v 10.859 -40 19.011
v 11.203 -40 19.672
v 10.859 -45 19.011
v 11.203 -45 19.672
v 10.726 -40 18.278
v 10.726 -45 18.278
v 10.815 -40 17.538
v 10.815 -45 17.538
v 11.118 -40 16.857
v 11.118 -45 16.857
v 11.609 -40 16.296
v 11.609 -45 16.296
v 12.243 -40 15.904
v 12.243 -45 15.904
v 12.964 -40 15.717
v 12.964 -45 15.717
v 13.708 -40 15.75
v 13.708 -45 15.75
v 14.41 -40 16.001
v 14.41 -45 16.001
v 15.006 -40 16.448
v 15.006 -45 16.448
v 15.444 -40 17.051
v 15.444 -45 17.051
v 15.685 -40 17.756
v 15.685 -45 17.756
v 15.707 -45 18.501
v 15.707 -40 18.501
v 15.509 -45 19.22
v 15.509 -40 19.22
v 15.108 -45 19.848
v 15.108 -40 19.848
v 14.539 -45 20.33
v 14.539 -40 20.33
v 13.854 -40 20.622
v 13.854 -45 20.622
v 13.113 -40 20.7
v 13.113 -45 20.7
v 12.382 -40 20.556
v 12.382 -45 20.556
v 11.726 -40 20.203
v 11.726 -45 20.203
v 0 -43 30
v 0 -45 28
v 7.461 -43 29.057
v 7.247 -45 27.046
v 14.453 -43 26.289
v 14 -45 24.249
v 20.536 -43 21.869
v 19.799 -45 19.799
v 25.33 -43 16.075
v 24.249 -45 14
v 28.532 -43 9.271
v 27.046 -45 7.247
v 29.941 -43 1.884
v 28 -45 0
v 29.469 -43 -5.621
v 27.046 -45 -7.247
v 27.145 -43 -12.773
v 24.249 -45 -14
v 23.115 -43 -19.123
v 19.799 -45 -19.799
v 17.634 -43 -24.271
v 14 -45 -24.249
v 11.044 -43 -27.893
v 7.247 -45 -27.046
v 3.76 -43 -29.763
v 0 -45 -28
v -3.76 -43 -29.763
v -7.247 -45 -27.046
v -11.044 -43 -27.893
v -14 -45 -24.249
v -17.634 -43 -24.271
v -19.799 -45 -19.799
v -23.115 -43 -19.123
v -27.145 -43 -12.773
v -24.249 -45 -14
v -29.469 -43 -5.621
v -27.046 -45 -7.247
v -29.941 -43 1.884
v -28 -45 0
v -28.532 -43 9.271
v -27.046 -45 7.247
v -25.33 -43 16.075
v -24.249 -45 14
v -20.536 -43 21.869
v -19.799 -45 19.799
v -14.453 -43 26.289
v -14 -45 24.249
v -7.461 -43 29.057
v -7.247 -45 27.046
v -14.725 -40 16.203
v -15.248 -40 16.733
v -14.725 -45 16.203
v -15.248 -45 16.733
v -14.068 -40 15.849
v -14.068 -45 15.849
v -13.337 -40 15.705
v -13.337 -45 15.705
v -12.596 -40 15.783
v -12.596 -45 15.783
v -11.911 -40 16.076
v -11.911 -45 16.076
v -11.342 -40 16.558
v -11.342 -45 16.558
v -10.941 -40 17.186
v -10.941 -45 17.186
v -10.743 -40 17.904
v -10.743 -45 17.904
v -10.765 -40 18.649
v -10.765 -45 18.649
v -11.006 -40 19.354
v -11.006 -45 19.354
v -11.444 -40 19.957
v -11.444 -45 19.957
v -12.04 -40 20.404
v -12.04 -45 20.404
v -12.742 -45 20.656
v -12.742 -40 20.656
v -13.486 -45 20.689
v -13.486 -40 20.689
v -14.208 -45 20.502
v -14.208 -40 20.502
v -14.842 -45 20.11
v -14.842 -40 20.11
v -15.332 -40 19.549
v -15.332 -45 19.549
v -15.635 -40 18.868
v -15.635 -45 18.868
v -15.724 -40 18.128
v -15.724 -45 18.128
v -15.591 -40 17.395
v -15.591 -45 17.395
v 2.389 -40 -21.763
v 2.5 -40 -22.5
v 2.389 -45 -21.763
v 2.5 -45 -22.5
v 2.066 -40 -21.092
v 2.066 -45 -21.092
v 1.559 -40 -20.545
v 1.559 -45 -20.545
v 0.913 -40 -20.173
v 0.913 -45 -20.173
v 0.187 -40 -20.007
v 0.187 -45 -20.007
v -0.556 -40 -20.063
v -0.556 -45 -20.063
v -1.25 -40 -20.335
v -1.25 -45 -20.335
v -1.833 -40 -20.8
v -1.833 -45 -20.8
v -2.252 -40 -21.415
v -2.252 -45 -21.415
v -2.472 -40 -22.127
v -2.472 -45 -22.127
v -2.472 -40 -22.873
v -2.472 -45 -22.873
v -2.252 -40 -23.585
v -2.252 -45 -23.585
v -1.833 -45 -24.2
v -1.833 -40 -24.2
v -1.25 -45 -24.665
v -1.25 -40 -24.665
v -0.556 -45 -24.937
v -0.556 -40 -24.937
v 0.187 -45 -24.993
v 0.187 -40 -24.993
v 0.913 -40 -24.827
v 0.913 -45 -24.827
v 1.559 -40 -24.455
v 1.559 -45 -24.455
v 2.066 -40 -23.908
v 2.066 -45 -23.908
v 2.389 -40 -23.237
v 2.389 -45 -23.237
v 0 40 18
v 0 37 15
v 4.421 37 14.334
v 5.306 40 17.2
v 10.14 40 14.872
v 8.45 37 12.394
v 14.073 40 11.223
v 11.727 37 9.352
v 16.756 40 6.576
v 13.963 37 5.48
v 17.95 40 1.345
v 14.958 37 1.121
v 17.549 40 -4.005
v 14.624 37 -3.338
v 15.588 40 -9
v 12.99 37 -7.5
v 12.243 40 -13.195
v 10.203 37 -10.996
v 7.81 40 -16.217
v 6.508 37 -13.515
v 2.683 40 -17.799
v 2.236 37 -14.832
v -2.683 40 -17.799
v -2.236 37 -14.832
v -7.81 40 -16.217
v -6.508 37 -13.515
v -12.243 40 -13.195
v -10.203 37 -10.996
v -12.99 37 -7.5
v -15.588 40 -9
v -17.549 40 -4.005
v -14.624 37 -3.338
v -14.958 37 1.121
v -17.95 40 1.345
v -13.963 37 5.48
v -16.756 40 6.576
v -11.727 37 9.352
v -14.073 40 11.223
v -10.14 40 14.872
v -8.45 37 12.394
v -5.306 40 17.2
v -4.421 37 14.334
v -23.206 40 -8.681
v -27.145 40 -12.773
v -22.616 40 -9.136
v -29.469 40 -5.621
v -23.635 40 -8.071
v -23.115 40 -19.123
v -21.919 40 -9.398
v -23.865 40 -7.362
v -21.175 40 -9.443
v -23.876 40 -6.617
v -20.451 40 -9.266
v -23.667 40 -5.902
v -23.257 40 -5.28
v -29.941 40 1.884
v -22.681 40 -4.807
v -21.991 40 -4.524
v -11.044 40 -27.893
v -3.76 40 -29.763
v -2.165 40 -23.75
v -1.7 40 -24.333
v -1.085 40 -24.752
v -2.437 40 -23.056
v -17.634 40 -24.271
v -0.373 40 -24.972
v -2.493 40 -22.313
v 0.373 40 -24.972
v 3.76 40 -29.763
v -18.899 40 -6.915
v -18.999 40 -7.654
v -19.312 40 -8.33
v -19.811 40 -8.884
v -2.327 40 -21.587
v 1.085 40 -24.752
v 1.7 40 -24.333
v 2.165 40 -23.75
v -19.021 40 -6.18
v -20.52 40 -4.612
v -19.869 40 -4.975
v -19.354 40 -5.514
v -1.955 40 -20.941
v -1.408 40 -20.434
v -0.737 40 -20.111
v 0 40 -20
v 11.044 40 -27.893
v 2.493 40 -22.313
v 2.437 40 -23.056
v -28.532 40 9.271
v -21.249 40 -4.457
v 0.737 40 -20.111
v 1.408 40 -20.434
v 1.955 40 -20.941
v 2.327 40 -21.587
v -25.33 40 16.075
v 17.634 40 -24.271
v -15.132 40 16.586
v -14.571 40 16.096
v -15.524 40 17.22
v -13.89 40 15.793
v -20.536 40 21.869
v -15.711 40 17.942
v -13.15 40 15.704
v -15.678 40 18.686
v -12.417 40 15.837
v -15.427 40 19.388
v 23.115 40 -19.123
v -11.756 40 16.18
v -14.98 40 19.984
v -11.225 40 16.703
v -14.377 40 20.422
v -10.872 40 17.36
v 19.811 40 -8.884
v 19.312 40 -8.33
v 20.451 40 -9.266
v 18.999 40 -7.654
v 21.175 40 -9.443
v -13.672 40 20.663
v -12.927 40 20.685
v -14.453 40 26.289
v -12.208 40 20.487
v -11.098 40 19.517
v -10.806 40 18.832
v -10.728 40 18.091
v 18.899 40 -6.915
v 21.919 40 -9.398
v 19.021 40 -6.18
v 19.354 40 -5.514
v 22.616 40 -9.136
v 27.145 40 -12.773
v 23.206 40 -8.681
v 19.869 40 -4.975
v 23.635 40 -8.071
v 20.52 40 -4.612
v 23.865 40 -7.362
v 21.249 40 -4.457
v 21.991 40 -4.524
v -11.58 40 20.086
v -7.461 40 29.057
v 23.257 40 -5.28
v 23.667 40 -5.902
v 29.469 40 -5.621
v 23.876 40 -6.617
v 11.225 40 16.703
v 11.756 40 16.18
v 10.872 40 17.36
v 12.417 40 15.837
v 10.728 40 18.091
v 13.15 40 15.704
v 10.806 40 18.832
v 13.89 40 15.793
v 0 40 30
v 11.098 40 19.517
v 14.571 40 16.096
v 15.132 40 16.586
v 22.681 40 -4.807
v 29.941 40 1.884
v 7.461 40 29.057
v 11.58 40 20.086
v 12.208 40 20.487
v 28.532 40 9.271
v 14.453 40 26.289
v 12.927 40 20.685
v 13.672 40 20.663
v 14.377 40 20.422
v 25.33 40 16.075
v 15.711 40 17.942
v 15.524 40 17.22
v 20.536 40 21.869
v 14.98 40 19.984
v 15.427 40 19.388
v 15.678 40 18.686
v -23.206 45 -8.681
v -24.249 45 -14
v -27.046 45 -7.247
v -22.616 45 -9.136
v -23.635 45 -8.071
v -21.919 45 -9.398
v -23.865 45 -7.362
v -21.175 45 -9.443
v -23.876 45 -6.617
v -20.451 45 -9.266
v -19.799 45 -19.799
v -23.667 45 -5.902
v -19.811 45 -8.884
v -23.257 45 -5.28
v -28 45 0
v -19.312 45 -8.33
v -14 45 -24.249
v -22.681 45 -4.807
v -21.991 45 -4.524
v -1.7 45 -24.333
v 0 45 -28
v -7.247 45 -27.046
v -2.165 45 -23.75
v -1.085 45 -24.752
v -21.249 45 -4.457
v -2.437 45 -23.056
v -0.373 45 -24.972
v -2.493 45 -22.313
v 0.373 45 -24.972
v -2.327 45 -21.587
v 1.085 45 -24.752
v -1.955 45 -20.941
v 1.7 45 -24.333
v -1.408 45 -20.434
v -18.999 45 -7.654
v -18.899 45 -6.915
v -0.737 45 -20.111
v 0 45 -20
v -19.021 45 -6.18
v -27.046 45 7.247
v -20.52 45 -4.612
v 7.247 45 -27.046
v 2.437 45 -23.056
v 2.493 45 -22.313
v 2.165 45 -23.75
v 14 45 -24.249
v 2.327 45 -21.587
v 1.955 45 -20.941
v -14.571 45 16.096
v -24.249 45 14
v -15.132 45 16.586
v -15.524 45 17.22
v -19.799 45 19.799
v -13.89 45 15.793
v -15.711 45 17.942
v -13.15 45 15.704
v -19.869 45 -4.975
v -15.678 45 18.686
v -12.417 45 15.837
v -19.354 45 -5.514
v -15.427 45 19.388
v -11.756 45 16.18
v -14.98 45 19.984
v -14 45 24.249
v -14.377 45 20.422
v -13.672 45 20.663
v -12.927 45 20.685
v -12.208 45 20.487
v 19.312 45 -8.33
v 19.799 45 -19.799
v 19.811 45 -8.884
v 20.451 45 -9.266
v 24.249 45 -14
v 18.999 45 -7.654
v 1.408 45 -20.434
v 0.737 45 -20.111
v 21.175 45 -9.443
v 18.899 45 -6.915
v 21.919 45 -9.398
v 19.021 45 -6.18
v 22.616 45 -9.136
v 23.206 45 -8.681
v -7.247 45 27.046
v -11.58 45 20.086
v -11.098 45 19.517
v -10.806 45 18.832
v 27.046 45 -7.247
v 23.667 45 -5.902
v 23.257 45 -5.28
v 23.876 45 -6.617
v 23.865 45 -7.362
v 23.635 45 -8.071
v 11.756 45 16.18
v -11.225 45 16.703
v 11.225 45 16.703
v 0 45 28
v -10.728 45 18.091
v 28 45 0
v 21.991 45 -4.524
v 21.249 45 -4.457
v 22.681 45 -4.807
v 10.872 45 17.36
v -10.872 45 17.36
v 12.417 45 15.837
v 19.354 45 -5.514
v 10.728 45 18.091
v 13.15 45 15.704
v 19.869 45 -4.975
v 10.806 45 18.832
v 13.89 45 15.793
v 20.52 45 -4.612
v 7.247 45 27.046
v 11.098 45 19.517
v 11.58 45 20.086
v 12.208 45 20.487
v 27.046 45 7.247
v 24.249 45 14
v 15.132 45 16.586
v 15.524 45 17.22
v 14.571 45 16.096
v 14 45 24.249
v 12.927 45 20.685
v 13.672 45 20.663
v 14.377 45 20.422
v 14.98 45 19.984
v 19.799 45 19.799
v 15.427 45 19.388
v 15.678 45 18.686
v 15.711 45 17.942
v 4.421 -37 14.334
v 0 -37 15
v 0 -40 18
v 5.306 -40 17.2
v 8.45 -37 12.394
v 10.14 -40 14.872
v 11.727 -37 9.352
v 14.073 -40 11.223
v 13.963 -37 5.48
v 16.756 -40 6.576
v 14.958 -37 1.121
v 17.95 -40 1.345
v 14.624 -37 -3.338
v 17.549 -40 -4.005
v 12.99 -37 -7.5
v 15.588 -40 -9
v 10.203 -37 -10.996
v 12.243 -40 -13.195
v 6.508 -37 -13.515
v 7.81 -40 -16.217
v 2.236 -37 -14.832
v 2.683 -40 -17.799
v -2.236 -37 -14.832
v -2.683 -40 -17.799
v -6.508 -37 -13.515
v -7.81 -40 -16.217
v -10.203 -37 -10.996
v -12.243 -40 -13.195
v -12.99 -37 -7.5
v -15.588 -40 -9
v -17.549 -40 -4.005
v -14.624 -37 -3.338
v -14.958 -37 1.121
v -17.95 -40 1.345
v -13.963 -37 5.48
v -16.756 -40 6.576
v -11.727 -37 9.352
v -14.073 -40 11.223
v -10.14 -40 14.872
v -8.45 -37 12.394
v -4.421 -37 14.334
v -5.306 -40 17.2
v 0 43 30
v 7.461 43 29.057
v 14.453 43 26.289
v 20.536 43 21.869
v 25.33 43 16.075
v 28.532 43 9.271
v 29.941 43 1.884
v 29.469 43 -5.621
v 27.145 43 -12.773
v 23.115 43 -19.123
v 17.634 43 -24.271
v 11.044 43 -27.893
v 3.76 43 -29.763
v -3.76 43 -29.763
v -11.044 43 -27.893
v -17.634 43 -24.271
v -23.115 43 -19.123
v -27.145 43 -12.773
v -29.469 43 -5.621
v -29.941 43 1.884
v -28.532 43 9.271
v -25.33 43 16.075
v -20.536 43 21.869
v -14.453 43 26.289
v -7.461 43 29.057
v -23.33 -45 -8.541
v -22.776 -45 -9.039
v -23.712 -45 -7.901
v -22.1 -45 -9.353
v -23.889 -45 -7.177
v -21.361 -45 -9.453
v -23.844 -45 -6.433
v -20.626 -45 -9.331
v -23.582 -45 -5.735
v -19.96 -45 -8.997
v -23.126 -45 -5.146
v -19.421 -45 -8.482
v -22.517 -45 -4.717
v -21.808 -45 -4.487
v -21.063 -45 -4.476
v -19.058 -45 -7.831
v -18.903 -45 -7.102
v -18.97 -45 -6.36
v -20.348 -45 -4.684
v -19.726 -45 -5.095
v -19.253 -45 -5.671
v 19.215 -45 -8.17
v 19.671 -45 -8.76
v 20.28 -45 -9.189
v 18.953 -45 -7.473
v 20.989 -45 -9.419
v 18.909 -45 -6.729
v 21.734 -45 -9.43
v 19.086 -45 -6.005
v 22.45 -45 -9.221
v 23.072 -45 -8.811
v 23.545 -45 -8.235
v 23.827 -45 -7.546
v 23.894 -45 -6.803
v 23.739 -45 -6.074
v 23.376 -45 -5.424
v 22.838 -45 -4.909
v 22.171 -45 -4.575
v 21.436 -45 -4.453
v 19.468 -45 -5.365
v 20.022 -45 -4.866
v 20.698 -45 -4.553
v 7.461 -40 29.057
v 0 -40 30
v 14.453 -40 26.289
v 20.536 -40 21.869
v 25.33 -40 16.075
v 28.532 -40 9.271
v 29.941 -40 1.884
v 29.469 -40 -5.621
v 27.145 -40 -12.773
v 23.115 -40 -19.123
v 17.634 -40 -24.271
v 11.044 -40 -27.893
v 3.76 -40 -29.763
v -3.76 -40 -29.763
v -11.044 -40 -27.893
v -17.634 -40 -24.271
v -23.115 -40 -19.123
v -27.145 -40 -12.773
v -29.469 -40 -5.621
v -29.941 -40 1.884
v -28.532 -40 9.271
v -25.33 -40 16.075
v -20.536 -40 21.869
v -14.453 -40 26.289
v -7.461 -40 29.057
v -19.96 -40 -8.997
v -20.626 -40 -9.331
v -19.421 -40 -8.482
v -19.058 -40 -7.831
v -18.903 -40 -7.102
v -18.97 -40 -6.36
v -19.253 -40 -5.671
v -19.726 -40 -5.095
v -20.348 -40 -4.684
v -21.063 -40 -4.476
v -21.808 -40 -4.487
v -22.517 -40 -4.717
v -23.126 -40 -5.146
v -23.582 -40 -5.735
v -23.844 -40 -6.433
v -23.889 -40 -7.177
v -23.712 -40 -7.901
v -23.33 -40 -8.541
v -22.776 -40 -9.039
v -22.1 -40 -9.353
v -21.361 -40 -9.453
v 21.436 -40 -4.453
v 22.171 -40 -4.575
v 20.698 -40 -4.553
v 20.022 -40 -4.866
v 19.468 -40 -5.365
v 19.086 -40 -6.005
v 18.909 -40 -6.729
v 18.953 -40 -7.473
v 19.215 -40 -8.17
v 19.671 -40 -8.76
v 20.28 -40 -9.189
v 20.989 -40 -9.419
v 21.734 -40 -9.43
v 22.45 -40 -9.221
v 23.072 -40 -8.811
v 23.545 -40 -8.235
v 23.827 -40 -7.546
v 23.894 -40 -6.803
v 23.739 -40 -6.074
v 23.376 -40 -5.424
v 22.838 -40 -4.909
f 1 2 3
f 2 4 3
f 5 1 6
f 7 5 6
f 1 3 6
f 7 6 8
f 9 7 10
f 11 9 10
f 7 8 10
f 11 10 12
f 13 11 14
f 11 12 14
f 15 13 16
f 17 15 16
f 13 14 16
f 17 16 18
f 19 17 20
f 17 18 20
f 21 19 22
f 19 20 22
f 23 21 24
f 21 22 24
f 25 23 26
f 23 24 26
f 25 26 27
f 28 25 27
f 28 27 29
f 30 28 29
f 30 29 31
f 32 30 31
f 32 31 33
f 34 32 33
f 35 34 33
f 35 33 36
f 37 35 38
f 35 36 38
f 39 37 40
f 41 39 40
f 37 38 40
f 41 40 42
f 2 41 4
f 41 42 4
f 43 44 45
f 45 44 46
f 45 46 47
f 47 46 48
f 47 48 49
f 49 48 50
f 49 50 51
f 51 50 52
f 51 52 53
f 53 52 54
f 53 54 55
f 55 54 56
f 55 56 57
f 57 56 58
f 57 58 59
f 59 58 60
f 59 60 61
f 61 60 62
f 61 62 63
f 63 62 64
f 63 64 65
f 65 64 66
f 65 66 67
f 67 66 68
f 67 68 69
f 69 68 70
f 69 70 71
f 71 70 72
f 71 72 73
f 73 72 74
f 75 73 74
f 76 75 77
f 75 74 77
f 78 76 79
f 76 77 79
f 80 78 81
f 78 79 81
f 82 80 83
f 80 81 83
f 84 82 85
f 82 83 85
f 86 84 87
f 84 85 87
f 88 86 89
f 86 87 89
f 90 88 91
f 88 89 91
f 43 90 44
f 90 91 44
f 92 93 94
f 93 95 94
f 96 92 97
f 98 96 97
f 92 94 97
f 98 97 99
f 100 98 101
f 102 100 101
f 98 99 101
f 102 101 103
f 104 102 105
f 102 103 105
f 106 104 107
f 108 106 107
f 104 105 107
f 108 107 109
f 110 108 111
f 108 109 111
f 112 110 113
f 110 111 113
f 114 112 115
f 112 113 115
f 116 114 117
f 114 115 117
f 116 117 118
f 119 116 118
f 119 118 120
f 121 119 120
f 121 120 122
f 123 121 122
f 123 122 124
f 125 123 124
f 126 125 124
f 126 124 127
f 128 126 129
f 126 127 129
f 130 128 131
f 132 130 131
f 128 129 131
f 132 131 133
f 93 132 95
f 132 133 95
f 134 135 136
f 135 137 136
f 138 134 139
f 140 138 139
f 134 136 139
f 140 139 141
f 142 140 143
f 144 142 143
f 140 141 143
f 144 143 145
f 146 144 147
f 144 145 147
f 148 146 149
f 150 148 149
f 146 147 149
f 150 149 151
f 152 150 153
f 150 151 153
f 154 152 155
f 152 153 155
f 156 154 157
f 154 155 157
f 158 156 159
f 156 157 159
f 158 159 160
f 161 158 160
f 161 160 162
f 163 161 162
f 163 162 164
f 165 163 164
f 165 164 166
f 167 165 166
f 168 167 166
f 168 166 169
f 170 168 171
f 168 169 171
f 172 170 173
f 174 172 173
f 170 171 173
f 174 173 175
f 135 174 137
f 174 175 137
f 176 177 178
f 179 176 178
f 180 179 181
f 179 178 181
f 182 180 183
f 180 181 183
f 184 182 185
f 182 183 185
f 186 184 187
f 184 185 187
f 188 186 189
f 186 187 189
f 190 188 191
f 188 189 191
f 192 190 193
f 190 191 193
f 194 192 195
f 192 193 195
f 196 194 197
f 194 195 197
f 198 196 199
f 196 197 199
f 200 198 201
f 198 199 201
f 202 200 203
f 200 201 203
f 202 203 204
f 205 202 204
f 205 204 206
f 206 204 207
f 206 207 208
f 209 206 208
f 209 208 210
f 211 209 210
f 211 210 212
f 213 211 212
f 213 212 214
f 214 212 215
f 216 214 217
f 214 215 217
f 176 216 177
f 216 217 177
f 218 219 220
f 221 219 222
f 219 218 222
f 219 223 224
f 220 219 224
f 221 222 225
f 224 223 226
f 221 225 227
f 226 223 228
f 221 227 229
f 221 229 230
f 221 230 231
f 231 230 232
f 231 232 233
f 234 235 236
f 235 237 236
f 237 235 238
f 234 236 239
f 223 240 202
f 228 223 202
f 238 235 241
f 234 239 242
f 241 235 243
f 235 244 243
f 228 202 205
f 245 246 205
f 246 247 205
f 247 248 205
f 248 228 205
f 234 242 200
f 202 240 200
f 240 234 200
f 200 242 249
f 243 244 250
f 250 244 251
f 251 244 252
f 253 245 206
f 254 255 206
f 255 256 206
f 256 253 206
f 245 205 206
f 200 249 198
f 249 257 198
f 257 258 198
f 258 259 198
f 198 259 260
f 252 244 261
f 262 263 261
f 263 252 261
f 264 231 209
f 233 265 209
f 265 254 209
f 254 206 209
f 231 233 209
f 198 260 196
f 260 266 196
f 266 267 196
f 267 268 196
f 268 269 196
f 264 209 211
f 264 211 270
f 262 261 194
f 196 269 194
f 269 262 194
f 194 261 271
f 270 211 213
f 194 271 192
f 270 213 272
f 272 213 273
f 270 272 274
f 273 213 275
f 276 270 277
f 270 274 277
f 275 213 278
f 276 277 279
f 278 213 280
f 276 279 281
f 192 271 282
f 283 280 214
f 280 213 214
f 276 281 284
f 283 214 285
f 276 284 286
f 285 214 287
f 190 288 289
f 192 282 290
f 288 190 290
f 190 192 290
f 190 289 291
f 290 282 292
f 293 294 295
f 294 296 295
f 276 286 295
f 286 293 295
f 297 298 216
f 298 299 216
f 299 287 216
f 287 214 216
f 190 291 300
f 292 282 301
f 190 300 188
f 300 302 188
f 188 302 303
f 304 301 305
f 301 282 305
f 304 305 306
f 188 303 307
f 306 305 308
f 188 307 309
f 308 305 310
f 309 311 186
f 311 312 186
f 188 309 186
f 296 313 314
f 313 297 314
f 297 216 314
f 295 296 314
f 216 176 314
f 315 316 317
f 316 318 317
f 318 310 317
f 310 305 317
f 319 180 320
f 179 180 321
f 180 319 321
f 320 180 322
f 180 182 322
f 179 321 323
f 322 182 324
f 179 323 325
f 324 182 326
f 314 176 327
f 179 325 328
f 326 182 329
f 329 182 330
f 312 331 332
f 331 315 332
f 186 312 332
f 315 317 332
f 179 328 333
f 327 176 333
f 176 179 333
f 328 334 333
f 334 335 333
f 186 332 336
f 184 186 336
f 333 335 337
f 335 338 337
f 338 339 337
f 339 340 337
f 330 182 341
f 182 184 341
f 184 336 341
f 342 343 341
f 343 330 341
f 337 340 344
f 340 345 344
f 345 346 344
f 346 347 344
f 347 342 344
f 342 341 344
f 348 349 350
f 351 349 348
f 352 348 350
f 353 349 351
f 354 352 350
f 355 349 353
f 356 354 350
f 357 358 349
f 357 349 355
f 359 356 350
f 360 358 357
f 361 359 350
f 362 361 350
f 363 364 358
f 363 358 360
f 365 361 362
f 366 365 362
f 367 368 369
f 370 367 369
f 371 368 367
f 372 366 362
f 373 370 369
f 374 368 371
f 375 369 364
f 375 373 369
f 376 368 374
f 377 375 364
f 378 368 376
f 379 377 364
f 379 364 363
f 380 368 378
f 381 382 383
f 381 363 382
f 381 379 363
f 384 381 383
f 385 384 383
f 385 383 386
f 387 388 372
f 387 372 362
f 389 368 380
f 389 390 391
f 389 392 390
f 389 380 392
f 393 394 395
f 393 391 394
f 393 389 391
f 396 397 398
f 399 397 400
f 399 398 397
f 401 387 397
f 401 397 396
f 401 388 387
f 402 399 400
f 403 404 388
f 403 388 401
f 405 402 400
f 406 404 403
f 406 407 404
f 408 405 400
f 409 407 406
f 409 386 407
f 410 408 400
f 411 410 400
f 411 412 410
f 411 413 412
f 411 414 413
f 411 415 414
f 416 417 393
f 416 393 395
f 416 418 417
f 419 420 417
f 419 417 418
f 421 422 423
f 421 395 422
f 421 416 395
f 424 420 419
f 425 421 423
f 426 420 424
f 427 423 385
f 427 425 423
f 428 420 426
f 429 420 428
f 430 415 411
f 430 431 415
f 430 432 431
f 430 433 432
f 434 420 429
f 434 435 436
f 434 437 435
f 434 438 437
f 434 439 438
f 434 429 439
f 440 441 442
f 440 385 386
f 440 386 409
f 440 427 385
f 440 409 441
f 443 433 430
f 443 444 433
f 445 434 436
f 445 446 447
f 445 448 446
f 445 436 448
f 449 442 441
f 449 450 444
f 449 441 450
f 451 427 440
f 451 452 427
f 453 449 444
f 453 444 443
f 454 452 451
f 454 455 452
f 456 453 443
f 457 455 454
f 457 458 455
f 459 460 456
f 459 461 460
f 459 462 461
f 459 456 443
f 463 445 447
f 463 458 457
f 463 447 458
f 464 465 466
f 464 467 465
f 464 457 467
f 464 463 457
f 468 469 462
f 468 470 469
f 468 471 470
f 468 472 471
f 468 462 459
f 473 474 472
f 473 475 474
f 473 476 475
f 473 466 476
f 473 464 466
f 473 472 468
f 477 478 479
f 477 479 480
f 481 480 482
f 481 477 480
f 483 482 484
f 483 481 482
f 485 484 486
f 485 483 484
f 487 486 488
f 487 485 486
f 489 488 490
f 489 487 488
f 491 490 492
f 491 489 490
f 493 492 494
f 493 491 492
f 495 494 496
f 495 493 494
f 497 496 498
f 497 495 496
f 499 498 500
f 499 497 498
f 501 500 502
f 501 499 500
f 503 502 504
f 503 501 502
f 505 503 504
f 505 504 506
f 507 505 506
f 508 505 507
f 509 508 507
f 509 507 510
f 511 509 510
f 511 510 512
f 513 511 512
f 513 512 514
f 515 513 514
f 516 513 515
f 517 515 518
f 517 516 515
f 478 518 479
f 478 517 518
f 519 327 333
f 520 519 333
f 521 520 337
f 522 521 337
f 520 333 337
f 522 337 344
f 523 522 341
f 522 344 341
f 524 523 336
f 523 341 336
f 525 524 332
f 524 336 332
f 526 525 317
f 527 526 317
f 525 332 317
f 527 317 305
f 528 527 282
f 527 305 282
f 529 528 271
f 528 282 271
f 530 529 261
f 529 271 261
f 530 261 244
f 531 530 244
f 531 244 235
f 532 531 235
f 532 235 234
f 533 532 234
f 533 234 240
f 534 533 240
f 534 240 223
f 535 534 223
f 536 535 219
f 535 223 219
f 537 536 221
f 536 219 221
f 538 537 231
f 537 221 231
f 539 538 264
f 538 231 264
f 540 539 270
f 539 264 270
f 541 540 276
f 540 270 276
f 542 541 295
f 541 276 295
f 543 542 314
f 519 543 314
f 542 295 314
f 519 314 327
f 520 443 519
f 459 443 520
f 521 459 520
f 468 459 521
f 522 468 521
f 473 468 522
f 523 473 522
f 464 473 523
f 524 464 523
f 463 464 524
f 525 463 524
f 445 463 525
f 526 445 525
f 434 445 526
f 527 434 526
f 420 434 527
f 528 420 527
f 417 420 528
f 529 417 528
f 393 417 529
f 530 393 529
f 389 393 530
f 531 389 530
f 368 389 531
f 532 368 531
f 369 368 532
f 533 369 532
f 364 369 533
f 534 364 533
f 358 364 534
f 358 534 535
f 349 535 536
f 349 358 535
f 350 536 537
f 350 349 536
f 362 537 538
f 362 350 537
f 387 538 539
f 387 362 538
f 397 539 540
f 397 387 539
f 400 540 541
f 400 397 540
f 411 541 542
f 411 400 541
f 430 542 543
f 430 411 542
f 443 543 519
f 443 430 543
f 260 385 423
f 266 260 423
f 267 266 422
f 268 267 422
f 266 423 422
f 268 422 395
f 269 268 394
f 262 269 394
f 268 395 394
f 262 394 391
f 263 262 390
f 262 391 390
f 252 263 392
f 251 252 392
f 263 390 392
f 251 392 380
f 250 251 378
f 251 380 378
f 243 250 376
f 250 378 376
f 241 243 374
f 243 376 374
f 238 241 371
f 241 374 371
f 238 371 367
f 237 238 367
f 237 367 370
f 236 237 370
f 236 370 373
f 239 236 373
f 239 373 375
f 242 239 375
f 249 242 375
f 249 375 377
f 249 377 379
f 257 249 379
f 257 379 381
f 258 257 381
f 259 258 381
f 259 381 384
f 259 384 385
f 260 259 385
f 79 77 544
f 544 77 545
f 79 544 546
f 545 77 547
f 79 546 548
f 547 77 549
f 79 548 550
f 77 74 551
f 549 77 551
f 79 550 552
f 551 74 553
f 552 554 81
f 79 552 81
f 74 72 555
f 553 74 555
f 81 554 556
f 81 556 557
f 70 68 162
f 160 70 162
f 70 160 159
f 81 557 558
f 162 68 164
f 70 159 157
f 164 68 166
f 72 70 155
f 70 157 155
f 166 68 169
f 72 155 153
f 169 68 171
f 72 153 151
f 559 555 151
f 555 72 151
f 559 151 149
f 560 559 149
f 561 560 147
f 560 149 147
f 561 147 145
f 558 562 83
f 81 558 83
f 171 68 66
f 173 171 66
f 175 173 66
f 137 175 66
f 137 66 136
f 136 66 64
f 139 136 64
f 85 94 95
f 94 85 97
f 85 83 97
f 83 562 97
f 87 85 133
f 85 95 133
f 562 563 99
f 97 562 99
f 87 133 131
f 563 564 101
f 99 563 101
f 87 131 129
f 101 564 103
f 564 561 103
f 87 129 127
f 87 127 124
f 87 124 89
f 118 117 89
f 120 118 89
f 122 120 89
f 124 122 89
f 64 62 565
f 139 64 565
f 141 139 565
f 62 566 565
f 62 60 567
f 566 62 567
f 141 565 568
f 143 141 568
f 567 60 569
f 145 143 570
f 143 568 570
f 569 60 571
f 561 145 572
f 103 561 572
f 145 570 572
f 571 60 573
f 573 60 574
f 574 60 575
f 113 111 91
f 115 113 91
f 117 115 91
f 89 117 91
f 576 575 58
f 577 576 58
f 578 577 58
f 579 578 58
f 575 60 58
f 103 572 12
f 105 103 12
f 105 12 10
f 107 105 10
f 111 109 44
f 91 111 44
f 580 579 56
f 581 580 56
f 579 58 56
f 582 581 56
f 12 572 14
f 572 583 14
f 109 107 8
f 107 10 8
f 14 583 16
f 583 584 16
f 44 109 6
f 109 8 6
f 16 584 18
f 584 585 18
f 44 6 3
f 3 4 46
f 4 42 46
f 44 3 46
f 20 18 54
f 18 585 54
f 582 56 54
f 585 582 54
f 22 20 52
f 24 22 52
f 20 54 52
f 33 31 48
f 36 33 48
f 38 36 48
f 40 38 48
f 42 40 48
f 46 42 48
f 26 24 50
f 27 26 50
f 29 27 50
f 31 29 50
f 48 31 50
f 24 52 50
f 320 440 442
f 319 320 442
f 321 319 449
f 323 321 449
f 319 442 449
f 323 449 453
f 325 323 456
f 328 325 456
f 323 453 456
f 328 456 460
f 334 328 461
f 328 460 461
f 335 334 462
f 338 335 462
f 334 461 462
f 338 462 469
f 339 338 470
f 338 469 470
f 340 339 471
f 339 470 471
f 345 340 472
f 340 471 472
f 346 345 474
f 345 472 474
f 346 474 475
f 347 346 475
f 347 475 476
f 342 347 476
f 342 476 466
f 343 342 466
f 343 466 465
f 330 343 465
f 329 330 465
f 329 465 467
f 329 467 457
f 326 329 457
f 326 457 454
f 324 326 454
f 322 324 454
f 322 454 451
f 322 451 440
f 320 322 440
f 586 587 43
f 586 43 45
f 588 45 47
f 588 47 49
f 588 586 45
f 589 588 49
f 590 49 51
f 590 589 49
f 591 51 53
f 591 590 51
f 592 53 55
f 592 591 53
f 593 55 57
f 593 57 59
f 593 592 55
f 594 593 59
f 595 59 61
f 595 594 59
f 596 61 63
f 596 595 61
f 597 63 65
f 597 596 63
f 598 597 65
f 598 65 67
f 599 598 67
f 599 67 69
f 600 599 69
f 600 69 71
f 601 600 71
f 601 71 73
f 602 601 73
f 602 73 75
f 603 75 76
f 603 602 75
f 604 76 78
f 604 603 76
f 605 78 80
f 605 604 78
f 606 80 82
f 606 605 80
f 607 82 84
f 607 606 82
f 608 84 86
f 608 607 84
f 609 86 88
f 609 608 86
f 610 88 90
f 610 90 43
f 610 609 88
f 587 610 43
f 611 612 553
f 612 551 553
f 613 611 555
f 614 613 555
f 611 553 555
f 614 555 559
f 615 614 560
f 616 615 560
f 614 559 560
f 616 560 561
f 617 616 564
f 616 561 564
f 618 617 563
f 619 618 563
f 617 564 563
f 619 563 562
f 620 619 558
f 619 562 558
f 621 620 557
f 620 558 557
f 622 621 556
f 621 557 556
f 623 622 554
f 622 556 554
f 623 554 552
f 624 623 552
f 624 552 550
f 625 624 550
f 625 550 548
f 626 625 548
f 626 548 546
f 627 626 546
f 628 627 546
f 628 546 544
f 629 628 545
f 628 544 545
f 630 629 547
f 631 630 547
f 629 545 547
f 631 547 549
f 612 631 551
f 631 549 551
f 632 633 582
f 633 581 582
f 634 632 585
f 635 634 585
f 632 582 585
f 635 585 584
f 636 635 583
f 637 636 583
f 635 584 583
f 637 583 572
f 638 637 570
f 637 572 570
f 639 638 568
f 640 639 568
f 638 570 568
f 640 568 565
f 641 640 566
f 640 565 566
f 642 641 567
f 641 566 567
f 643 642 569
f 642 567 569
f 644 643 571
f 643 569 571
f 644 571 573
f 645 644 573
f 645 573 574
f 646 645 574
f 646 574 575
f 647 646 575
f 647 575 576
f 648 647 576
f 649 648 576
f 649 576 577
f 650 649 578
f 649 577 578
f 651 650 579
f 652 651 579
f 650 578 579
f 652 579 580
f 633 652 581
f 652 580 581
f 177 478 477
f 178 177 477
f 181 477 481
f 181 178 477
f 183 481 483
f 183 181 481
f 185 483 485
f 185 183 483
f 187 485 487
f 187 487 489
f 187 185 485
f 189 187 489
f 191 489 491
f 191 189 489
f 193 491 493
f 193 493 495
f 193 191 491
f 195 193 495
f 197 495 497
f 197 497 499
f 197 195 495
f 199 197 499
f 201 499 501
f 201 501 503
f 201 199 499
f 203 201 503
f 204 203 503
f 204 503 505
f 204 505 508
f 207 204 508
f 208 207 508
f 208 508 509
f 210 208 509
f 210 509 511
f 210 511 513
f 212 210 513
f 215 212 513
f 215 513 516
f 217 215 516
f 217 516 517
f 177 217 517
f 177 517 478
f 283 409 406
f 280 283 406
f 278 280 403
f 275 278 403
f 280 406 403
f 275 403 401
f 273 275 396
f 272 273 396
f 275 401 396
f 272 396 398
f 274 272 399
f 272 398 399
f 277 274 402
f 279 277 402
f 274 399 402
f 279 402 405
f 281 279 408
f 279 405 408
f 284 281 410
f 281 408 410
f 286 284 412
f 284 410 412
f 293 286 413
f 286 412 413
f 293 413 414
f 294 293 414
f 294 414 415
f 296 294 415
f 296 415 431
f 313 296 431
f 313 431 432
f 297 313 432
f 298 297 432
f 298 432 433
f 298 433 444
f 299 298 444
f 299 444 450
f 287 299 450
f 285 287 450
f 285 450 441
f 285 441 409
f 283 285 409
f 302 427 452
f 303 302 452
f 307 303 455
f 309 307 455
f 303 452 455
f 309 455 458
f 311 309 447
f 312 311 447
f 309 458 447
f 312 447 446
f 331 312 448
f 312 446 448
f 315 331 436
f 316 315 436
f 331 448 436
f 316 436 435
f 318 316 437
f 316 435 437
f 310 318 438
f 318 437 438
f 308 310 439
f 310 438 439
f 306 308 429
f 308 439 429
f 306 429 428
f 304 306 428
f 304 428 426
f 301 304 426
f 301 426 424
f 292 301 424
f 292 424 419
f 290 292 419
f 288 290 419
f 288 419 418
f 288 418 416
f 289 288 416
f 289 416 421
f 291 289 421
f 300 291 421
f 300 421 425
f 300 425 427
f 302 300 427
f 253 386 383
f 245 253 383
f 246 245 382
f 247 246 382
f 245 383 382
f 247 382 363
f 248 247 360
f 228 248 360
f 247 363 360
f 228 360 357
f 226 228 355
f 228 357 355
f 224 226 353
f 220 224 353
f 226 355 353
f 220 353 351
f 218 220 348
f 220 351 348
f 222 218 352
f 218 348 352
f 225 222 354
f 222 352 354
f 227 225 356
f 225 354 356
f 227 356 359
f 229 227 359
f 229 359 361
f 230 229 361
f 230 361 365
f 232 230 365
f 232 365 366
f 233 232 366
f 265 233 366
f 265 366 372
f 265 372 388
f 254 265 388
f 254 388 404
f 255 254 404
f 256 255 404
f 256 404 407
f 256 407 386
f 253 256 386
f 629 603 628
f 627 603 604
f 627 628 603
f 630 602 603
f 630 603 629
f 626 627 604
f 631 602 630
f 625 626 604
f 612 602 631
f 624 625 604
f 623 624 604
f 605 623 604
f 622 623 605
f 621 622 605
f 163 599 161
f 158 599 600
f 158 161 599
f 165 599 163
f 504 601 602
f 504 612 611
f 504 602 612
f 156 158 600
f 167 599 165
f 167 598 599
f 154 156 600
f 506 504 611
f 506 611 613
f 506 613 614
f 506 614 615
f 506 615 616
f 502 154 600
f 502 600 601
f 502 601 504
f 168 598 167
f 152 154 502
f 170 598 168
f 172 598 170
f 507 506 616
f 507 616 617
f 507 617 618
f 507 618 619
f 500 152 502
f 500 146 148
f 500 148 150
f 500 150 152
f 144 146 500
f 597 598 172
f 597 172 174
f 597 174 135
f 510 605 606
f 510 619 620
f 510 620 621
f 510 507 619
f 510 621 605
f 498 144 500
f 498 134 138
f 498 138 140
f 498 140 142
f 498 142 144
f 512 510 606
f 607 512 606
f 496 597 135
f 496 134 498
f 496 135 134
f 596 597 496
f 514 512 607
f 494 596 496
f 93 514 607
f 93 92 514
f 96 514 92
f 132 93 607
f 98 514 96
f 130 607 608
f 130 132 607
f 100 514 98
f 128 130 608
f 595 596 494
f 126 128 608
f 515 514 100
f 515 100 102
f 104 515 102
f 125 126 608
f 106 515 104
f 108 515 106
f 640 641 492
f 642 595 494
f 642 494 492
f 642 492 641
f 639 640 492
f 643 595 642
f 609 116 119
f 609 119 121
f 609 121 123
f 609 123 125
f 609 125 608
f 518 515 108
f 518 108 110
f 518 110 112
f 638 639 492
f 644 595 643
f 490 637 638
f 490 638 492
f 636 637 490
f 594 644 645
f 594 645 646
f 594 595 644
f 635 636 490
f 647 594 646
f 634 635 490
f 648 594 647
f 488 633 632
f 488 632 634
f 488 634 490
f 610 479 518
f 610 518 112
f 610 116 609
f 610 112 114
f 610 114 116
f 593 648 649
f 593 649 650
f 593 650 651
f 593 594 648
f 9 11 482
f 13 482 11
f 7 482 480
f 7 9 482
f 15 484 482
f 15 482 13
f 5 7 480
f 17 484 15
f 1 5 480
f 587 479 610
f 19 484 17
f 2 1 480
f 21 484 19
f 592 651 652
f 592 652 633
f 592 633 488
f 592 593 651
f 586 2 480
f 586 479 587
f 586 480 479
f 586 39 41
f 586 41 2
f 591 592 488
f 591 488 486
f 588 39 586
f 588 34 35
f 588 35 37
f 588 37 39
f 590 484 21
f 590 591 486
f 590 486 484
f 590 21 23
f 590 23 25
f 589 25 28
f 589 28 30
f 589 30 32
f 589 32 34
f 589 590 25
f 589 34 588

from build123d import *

# Parameters (mm, degrees)
SKETCH1_R                = 15
BOSS_EXTRUDE1_DEPTH      = 40
SKETCH4_R                = 30
BOSS_EXTRUDE2_DEPTH      = 5
CHAMFER1_SIZE            = 2
SKETCH6_R                = 2.5
CUT_EXTRUDE1_DEPTH       = 96
CIRPATTERN1_COUNT        = 5
CHAMFER2_SIZE            = 3
MIRROR1_COPY_1_SKETCH_R  = 2.5
MIRROR1_COPY_1_DEPTH     = 96
MIRROR1_COPY_2_SKETCH_R  = 2.5
MIRROR1_COPY_2_DEPTH     = 96
MIRROR1_COPY_3_SKETCH_R  = 2.5
MIRROR1_COPY_3_DEPTH     = 96
MIRROR1_COPY_4_SKETCH_R  = 2.5
MIRROR1_COPY_4_DEPTH     = 96
MIRROR1_COPY_5_SKETCH_R  = 2.5
MIRROR1_COPY_5_DEPTH     = 96
CHAMFER1_OF_MIRROR1_SIZE = 2
CHAMFER2_OF_MIRROR1_SIZE = 3


with BuildPart() as part:
    # Sketch1 → Boss-Extrude1 (new, symmetric)
    with BuildSketch(Plane(origin=(0, 0, 0), x_dir=(1, 0, 0), z_dir=(0, 1, 0))):
        with Locations(Location((0, 0, 0), (0, 0, 270))):
            Circle(SKETCH1_R)
    extrude(amount=BOSS_EXTRUDE1_DEPTH, both=True)

    # Sketch4 → Boss-Extrude2 (add)
    with BuildSketch(Plane(origin=(0, 40, 0), x_dir=(1, 0, 0), z_dir=(0, 1, 0))):
        with Locations(Location((0, 0, 0), (0, 0, 270))):
            Circle(SKETCH4_R)
    boss_extrude2 = extrude(amount=BOSS_EXTRUDE2_DEPTH)

    # Chamfer1
    chamfer1_edges = [part.edges().sort_by_distance(p)[0] for p in [
        (0, 45, -30),
    ]]
    chamfer(chamfer1_edges, length=CHAMFER1_SIZE)

    # Sketch6 → Cut-Extrude1 (cut, through all)
    with BuildSketch(Plane(origin=(0, 45, 0), x_dir=(1, 0, 0), z_dir=(0, 1, 0))):
        with Locations(Location((0, 22.5, 0), (0, 0, 270))):
            Circle(SKETCH6_R)
    cut_extrude1 = extrude(amount=-CUT_EXTRUDE1_DEPTH, mode=Mode.SUBTRACT)

    # CirPattern1: Cut-Extrude1 ×5 about axis
    cirpattern1_axis = Axis((0, 0, 0), (0, 1, 0))
    for i in range(1, CIRPATTERN1_COUNT):
        add(cut_extrude1.rotate(cirpattern1_axis, i * 360 / CIRPATTERN1_COUNT), mode=Mode.SUBTRACT)

    # Chamfer2
    chamfer2_edges = [part.edges().sort_by_distance(p)[0] for p in [
        (0, 40, -15),
    ]]
    chamfer(chamfer2_edges, length=CHAMFER2_SIZE)

    # Mirror1: Boss-Extrude2 across plane
    add(boss_extrude2.mirror(Plane.ZX))

    # Mirror1 copy 1 sketch → Mirror1 copy 1 (cut, through all)
    with BuildSketch(Plane(origin=(0, -45, 0), x_dir=(0.30901699437494745, 0, -0.9510565162951535), z_dir=(0, -1, 0))):
        with Locations((0, -22.5)):
            Circle(MIRROR1_COPY_1_SKETCH_R)
    extrude(amount=-MIRROR1_COPY_1_DEPTH, mode=Mode.SUBTRACT)

    # Mirror1 copy 2 sketch → Mirror1 copy 2 (cut, through all)
    with BuildSketch(Plane(origin=(0, -45, 0), x_dir=(-0.8090169943749473, 0, -0.5877852522924732), z_dir=(0, -1, 0))):
        with Locations((0, -22.5)):
            Circle(MIRROR1_COPY_2_SKETCH_R)
    extrude(amount=-MIRROR1_COPY_2_DEPTH, mode=Mode.SUBTRACT)

    # Mirror1 copy 3 sketch → Mirror1 copy 3 (cut, through all)
    with BuildSketch(Plane(origin=(0, -45, 0), x_dir=(-0.8090169943749476, 0, 0.587785252292473), z_dir=(0, -1, 0))):
        with Locations((0, -22.5)):
            Circle(MIRROR1_COPY_3_SKETCH_R)
    extrude(amount=-MIRROR1_COPY_3_DEPTH, mode=Mode.SUBTRACT)

    # Mirror1 copy 4 sketch → Mirror1 copy 4 (cut, through all)
    with BuildSketch(Plane(origin=(0, -45, 0), x_dir=(0.30901699437494723, 0, 0.9510565162951536), z_dir=(0, -1, 0))):
        with Locations((0, -22.5)):
            Circle(MIRROR1_COPY_4_SKETCH_R)
    extrude(amount=-MIRROR1_COPY_4_DEPTH, mode=Mode.SUBTRACT)

    # Mirror1 copy 5 sketch → Mirror1 copy 5 (cut, through all)
    with BuildSketch(Plane.XZ.offset(45)):
        with Locations((0, -22.5)):
            Circle(MIRROR1_COPY_5_SKETCH_R)
    extrude(amount=-MIRROR1_COPY_5_DEPTH, mode=Mode.SUBTRACT)

    # Chamfer1 of Mirror1
    chamfer1_of_mirror1_edges = [part.edges().sort_by_distance(p)[0] for p in [
        (0, -45, -30),
    ]]
    chamfer(chamfer1_of_mirror1_edges, length=CHAMFER1_OF_MIRROR1_SIZE)

    # Chamfer2 of Mirror1
    chamfer2_of_mirror1_edges = [part.edges().sort_by_distance(p)[0] for p in [
        (0, -40, -15),
    ]]
    chamfer(chamfer2_of_mirror1_edges, length=CHAMFER2_OF_MIRROR1_SIZE)


solid = part.part
